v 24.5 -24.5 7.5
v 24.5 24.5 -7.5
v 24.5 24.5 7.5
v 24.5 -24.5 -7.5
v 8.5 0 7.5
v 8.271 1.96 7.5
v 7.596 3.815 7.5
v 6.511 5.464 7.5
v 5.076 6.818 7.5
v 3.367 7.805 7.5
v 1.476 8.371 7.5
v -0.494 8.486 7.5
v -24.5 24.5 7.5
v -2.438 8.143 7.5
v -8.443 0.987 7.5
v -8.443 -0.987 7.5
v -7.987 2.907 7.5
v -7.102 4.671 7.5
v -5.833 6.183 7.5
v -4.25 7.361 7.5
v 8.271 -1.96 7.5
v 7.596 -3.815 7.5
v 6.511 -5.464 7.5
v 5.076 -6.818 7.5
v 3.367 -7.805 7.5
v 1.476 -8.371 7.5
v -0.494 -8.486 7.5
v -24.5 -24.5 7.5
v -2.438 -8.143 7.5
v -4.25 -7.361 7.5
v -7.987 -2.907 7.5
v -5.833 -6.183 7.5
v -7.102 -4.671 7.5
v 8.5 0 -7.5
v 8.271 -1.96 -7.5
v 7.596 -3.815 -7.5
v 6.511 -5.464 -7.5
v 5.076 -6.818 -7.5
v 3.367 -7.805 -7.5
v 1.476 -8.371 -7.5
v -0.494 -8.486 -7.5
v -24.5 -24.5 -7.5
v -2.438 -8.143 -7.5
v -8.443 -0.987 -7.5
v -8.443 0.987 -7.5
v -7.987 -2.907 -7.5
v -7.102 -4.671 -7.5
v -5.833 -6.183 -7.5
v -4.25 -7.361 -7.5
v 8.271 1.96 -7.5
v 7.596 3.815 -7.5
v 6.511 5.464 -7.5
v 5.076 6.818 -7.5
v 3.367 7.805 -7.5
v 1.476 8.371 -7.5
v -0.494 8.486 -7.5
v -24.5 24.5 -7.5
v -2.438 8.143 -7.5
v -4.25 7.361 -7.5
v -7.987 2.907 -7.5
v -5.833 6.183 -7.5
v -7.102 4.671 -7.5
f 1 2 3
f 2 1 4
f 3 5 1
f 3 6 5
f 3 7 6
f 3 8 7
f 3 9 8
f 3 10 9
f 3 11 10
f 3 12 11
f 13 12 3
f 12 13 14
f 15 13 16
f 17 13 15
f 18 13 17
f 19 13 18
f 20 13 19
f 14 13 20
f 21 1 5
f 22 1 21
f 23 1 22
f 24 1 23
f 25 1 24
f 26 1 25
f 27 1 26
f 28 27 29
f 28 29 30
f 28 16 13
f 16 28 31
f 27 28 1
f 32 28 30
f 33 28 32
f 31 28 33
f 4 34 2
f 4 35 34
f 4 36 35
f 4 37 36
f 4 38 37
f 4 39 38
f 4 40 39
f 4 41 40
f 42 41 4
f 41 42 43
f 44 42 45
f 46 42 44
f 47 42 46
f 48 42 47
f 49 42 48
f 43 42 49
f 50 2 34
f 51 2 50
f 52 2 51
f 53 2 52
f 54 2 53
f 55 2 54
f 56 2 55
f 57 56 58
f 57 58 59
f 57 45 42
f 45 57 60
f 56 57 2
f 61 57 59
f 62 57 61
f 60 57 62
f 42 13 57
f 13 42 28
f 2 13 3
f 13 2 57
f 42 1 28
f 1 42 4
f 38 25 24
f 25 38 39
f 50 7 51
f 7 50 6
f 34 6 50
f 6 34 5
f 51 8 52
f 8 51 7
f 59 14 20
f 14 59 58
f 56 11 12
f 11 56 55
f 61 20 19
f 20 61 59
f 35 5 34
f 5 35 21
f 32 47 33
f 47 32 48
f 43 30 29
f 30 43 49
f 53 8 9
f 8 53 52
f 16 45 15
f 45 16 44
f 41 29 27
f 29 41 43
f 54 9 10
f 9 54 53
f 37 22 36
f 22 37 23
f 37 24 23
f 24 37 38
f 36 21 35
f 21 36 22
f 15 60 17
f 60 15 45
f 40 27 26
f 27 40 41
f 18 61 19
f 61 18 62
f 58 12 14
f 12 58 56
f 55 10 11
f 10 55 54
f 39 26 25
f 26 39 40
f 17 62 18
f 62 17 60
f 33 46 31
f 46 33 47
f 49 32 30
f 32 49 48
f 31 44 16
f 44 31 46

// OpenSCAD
//use <MCAD/regular_shapes.scad>

module rounded(radius) {
	difference() {
		cube([radius*2,radius*2,20], center=true);
		translate([radius,radius,0])
			cylinder(r=radius,h=21,center=true, $fn=25);
	}
}

module toy3_shape()
{
	linear_extrude(height=15,center=true,convexity=0,twist=0) {
		circle(r=34, $fn=3);
	}
}

module toy4_shape()
{
	cube([49,49,15],center=true);	
}

module hole()
{
	cylinder(r=8.5,h=20,center=true);
}

module toy3_with_hole() {
	difference() {
		toy3_shape();
		hole();
	}
}

module toy4_with_hole() {
	difference() {
		toy4_shape();
		hole();
	}
}

module toy3() {
	difference() {
		rotate([0,0,30])
		toy3_with_hole();

		translate([0, -33.3, 0])
		rotate([0,0,45])
		rounded(2);

		rotate([0,0,120])
		translate([0, -33.3, 0])
		rotate([0,0,45])
		rounded(2);

		rotate([0,0,240])
		translate([0, -33.3, 0])
		rotate([0,0,45])
		rounded(2);
	}
}

module toy4() {
	toy4_with_hole();
}

toy4();
